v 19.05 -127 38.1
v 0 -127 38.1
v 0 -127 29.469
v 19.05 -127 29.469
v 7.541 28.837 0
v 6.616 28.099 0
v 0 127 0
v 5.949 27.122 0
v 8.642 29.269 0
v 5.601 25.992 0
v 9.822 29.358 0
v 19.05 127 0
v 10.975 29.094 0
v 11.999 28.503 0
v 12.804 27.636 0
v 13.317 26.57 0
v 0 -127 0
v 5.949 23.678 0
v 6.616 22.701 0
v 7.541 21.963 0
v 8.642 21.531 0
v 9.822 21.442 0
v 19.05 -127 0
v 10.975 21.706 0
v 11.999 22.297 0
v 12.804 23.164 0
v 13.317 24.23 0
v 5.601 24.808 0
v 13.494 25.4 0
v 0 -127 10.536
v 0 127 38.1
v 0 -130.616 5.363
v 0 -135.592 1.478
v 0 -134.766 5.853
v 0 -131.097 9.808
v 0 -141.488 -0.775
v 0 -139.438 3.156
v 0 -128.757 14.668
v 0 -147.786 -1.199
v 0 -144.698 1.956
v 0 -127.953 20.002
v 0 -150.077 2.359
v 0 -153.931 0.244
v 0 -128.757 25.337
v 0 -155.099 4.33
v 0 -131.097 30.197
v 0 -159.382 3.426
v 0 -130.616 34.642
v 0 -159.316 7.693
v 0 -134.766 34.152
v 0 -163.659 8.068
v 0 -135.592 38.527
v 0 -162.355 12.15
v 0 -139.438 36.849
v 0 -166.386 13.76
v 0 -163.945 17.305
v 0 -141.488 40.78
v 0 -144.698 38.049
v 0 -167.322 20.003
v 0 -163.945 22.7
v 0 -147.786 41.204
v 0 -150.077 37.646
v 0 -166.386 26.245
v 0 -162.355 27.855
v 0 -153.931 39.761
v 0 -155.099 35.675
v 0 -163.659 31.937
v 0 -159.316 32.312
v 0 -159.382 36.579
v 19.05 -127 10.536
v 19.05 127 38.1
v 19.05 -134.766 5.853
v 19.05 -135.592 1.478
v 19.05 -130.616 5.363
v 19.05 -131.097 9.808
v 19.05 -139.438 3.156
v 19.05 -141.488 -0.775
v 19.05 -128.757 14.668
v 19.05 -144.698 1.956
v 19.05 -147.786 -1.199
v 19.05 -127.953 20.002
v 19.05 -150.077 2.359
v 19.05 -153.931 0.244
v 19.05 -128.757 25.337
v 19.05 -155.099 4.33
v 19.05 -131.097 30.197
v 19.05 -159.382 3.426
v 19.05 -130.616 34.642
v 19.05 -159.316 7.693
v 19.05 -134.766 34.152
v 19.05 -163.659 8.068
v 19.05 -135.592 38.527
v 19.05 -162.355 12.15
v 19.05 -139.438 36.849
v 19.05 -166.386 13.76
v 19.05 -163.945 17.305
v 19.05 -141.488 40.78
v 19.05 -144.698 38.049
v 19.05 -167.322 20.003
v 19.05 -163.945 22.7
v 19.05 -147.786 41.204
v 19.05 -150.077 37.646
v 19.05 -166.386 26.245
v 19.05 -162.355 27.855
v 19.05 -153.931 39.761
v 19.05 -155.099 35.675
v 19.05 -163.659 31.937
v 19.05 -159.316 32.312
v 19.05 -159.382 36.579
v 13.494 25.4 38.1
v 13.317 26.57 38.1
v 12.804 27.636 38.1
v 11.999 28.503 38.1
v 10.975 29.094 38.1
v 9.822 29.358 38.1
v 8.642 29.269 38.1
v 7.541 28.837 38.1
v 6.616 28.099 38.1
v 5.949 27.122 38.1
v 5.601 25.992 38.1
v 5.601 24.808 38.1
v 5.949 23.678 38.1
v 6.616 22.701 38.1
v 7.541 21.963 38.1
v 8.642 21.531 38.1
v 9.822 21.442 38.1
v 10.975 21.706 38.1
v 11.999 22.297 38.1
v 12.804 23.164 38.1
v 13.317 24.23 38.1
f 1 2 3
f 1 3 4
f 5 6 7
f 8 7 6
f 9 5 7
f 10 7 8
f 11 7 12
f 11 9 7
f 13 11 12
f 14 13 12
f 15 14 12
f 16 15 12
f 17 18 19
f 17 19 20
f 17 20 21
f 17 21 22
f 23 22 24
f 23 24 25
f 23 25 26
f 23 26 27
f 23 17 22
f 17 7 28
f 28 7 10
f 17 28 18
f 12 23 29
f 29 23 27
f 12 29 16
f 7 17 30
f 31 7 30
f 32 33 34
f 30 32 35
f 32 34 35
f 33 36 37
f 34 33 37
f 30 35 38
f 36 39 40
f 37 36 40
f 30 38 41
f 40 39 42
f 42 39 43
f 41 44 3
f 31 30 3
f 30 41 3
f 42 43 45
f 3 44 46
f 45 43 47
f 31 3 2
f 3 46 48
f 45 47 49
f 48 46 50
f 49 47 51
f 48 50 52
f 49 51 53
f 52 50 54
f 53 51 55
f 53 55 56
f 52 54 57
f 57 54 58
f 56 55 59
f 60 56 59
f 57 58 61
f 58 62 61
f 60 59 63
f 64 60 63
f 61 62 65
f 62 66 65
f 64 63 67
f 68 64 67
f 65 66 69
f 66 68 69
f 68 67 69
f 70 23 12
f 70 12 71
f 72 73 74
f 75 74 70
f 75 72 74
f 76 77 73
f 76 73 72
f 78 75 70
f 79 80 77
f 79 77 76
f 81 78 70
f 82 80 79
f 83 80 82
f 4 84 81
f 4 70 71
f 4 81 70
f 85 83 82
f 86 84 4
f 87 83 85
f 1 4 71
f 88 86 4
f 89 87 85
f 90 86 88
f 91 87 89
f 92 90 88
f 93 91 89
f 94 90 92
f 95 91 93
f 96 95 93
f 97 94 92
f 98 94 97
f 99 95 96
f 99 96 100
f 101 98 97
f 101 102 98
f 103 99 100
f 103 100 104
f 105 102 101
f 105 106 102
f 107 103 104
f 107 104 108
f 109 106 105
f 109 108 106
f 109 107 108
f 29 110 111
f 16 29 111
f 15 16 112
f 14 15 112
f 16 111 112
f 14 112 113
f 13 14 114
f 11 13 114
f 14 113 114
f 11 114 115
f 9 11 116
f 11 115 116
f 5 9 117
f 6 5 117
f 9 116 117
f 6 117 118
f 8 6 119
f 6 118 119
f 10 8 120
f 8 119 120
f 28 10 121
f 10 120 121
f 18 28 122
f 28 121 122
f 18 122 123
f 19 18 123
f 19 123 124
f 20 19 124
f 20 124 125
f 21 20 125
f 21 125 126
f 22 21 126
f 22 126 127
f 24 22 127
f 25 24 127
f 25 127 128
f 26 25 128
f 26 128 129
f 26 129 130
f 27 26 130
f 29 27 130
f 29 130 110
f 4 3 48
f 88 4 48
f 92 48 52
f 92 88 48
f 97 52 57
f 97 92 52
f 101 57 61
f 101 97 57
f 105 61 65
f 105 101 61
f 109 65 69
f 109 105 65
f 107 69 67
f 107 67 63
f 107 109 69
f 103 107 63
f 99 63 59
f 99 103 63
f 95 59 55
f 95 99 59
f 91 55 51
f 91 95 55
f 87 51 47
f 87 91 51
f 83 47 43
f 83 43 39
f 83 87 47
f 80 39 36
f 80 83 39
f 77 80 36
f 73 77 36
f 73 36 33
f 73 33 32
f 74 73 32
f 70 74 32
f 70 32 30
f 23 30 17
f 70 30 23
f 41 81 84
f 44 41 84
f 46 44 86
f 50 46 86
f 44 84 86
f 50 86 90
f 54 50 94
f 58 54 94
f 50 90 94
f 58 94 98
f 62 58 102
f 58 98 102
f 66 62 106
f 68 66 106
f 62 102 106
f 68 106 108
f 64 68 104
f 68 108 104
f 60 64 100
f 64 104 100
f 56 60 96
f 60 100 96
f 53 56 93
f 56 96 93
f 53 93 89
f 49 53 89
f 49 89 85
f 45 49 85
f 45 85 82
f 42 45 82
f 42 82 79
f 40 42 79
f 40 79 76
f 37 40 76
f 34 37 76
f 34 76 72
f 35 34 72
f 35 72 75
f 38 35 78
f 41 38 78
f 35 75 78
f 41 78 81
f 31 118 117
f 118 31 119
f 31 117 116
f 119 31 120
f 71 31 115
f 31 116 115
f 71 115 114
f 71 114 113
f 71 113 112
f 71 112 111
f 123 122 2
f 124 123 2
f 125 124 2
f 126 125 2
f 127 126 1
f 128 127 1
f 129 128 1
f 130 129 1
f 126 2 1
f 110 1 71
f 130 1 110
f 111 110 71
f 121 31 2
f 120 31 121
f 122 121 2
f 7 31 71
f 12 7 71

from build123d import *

# Parameters (mm, degrees)
F0_W     = 19.05
F0_H     = 38.1
F1_DEPTH = 127
F2_R     = 18.0975
F3_DEPTH = 19.05
F5_R     = 3.96875
F6_DEPTH = 39.371


with BuildPart() as f1:
    # F0 (on Front) → F1 (new body, symmetric)
    with BuildSketch(Plane.XZ):
        with Locations((9.525, 19.05)):
            Rectangle(F0_W, F0_H)
    extrude(amount=F1_DEPTH, both=True)


with BuildPart() as f3:
    # F2 (on face) → F3 (new body)
    with BuildSketch(Plane.YZ.offset(19.05)):
        with BuildLine():
            Line((-127, 10.535887), (-127, 29.469113))
            ThreePointArc((-127, 29.469113), (-167.3225, 20.0025), (-127, 10.535887))
        make_face()
        with Locations((-146.05, 20.0025)):
            Circle(F2_R, mode=Mode.SUBTRACT)
    extrude(amount=-F3_DEPTH)

    # F4: union F1
    add(f1.part)

    # F5 (on face) → F6 (cut, through all)
    with BuildSketch(Plane.XY.offset(38.1)):
        with Locations((9.525, 25.4)):
            Circle(F5_R)
    extrude(amount=-F6_DEPTH, mode=Mode.SUBTRACT)


solid = f3.part
